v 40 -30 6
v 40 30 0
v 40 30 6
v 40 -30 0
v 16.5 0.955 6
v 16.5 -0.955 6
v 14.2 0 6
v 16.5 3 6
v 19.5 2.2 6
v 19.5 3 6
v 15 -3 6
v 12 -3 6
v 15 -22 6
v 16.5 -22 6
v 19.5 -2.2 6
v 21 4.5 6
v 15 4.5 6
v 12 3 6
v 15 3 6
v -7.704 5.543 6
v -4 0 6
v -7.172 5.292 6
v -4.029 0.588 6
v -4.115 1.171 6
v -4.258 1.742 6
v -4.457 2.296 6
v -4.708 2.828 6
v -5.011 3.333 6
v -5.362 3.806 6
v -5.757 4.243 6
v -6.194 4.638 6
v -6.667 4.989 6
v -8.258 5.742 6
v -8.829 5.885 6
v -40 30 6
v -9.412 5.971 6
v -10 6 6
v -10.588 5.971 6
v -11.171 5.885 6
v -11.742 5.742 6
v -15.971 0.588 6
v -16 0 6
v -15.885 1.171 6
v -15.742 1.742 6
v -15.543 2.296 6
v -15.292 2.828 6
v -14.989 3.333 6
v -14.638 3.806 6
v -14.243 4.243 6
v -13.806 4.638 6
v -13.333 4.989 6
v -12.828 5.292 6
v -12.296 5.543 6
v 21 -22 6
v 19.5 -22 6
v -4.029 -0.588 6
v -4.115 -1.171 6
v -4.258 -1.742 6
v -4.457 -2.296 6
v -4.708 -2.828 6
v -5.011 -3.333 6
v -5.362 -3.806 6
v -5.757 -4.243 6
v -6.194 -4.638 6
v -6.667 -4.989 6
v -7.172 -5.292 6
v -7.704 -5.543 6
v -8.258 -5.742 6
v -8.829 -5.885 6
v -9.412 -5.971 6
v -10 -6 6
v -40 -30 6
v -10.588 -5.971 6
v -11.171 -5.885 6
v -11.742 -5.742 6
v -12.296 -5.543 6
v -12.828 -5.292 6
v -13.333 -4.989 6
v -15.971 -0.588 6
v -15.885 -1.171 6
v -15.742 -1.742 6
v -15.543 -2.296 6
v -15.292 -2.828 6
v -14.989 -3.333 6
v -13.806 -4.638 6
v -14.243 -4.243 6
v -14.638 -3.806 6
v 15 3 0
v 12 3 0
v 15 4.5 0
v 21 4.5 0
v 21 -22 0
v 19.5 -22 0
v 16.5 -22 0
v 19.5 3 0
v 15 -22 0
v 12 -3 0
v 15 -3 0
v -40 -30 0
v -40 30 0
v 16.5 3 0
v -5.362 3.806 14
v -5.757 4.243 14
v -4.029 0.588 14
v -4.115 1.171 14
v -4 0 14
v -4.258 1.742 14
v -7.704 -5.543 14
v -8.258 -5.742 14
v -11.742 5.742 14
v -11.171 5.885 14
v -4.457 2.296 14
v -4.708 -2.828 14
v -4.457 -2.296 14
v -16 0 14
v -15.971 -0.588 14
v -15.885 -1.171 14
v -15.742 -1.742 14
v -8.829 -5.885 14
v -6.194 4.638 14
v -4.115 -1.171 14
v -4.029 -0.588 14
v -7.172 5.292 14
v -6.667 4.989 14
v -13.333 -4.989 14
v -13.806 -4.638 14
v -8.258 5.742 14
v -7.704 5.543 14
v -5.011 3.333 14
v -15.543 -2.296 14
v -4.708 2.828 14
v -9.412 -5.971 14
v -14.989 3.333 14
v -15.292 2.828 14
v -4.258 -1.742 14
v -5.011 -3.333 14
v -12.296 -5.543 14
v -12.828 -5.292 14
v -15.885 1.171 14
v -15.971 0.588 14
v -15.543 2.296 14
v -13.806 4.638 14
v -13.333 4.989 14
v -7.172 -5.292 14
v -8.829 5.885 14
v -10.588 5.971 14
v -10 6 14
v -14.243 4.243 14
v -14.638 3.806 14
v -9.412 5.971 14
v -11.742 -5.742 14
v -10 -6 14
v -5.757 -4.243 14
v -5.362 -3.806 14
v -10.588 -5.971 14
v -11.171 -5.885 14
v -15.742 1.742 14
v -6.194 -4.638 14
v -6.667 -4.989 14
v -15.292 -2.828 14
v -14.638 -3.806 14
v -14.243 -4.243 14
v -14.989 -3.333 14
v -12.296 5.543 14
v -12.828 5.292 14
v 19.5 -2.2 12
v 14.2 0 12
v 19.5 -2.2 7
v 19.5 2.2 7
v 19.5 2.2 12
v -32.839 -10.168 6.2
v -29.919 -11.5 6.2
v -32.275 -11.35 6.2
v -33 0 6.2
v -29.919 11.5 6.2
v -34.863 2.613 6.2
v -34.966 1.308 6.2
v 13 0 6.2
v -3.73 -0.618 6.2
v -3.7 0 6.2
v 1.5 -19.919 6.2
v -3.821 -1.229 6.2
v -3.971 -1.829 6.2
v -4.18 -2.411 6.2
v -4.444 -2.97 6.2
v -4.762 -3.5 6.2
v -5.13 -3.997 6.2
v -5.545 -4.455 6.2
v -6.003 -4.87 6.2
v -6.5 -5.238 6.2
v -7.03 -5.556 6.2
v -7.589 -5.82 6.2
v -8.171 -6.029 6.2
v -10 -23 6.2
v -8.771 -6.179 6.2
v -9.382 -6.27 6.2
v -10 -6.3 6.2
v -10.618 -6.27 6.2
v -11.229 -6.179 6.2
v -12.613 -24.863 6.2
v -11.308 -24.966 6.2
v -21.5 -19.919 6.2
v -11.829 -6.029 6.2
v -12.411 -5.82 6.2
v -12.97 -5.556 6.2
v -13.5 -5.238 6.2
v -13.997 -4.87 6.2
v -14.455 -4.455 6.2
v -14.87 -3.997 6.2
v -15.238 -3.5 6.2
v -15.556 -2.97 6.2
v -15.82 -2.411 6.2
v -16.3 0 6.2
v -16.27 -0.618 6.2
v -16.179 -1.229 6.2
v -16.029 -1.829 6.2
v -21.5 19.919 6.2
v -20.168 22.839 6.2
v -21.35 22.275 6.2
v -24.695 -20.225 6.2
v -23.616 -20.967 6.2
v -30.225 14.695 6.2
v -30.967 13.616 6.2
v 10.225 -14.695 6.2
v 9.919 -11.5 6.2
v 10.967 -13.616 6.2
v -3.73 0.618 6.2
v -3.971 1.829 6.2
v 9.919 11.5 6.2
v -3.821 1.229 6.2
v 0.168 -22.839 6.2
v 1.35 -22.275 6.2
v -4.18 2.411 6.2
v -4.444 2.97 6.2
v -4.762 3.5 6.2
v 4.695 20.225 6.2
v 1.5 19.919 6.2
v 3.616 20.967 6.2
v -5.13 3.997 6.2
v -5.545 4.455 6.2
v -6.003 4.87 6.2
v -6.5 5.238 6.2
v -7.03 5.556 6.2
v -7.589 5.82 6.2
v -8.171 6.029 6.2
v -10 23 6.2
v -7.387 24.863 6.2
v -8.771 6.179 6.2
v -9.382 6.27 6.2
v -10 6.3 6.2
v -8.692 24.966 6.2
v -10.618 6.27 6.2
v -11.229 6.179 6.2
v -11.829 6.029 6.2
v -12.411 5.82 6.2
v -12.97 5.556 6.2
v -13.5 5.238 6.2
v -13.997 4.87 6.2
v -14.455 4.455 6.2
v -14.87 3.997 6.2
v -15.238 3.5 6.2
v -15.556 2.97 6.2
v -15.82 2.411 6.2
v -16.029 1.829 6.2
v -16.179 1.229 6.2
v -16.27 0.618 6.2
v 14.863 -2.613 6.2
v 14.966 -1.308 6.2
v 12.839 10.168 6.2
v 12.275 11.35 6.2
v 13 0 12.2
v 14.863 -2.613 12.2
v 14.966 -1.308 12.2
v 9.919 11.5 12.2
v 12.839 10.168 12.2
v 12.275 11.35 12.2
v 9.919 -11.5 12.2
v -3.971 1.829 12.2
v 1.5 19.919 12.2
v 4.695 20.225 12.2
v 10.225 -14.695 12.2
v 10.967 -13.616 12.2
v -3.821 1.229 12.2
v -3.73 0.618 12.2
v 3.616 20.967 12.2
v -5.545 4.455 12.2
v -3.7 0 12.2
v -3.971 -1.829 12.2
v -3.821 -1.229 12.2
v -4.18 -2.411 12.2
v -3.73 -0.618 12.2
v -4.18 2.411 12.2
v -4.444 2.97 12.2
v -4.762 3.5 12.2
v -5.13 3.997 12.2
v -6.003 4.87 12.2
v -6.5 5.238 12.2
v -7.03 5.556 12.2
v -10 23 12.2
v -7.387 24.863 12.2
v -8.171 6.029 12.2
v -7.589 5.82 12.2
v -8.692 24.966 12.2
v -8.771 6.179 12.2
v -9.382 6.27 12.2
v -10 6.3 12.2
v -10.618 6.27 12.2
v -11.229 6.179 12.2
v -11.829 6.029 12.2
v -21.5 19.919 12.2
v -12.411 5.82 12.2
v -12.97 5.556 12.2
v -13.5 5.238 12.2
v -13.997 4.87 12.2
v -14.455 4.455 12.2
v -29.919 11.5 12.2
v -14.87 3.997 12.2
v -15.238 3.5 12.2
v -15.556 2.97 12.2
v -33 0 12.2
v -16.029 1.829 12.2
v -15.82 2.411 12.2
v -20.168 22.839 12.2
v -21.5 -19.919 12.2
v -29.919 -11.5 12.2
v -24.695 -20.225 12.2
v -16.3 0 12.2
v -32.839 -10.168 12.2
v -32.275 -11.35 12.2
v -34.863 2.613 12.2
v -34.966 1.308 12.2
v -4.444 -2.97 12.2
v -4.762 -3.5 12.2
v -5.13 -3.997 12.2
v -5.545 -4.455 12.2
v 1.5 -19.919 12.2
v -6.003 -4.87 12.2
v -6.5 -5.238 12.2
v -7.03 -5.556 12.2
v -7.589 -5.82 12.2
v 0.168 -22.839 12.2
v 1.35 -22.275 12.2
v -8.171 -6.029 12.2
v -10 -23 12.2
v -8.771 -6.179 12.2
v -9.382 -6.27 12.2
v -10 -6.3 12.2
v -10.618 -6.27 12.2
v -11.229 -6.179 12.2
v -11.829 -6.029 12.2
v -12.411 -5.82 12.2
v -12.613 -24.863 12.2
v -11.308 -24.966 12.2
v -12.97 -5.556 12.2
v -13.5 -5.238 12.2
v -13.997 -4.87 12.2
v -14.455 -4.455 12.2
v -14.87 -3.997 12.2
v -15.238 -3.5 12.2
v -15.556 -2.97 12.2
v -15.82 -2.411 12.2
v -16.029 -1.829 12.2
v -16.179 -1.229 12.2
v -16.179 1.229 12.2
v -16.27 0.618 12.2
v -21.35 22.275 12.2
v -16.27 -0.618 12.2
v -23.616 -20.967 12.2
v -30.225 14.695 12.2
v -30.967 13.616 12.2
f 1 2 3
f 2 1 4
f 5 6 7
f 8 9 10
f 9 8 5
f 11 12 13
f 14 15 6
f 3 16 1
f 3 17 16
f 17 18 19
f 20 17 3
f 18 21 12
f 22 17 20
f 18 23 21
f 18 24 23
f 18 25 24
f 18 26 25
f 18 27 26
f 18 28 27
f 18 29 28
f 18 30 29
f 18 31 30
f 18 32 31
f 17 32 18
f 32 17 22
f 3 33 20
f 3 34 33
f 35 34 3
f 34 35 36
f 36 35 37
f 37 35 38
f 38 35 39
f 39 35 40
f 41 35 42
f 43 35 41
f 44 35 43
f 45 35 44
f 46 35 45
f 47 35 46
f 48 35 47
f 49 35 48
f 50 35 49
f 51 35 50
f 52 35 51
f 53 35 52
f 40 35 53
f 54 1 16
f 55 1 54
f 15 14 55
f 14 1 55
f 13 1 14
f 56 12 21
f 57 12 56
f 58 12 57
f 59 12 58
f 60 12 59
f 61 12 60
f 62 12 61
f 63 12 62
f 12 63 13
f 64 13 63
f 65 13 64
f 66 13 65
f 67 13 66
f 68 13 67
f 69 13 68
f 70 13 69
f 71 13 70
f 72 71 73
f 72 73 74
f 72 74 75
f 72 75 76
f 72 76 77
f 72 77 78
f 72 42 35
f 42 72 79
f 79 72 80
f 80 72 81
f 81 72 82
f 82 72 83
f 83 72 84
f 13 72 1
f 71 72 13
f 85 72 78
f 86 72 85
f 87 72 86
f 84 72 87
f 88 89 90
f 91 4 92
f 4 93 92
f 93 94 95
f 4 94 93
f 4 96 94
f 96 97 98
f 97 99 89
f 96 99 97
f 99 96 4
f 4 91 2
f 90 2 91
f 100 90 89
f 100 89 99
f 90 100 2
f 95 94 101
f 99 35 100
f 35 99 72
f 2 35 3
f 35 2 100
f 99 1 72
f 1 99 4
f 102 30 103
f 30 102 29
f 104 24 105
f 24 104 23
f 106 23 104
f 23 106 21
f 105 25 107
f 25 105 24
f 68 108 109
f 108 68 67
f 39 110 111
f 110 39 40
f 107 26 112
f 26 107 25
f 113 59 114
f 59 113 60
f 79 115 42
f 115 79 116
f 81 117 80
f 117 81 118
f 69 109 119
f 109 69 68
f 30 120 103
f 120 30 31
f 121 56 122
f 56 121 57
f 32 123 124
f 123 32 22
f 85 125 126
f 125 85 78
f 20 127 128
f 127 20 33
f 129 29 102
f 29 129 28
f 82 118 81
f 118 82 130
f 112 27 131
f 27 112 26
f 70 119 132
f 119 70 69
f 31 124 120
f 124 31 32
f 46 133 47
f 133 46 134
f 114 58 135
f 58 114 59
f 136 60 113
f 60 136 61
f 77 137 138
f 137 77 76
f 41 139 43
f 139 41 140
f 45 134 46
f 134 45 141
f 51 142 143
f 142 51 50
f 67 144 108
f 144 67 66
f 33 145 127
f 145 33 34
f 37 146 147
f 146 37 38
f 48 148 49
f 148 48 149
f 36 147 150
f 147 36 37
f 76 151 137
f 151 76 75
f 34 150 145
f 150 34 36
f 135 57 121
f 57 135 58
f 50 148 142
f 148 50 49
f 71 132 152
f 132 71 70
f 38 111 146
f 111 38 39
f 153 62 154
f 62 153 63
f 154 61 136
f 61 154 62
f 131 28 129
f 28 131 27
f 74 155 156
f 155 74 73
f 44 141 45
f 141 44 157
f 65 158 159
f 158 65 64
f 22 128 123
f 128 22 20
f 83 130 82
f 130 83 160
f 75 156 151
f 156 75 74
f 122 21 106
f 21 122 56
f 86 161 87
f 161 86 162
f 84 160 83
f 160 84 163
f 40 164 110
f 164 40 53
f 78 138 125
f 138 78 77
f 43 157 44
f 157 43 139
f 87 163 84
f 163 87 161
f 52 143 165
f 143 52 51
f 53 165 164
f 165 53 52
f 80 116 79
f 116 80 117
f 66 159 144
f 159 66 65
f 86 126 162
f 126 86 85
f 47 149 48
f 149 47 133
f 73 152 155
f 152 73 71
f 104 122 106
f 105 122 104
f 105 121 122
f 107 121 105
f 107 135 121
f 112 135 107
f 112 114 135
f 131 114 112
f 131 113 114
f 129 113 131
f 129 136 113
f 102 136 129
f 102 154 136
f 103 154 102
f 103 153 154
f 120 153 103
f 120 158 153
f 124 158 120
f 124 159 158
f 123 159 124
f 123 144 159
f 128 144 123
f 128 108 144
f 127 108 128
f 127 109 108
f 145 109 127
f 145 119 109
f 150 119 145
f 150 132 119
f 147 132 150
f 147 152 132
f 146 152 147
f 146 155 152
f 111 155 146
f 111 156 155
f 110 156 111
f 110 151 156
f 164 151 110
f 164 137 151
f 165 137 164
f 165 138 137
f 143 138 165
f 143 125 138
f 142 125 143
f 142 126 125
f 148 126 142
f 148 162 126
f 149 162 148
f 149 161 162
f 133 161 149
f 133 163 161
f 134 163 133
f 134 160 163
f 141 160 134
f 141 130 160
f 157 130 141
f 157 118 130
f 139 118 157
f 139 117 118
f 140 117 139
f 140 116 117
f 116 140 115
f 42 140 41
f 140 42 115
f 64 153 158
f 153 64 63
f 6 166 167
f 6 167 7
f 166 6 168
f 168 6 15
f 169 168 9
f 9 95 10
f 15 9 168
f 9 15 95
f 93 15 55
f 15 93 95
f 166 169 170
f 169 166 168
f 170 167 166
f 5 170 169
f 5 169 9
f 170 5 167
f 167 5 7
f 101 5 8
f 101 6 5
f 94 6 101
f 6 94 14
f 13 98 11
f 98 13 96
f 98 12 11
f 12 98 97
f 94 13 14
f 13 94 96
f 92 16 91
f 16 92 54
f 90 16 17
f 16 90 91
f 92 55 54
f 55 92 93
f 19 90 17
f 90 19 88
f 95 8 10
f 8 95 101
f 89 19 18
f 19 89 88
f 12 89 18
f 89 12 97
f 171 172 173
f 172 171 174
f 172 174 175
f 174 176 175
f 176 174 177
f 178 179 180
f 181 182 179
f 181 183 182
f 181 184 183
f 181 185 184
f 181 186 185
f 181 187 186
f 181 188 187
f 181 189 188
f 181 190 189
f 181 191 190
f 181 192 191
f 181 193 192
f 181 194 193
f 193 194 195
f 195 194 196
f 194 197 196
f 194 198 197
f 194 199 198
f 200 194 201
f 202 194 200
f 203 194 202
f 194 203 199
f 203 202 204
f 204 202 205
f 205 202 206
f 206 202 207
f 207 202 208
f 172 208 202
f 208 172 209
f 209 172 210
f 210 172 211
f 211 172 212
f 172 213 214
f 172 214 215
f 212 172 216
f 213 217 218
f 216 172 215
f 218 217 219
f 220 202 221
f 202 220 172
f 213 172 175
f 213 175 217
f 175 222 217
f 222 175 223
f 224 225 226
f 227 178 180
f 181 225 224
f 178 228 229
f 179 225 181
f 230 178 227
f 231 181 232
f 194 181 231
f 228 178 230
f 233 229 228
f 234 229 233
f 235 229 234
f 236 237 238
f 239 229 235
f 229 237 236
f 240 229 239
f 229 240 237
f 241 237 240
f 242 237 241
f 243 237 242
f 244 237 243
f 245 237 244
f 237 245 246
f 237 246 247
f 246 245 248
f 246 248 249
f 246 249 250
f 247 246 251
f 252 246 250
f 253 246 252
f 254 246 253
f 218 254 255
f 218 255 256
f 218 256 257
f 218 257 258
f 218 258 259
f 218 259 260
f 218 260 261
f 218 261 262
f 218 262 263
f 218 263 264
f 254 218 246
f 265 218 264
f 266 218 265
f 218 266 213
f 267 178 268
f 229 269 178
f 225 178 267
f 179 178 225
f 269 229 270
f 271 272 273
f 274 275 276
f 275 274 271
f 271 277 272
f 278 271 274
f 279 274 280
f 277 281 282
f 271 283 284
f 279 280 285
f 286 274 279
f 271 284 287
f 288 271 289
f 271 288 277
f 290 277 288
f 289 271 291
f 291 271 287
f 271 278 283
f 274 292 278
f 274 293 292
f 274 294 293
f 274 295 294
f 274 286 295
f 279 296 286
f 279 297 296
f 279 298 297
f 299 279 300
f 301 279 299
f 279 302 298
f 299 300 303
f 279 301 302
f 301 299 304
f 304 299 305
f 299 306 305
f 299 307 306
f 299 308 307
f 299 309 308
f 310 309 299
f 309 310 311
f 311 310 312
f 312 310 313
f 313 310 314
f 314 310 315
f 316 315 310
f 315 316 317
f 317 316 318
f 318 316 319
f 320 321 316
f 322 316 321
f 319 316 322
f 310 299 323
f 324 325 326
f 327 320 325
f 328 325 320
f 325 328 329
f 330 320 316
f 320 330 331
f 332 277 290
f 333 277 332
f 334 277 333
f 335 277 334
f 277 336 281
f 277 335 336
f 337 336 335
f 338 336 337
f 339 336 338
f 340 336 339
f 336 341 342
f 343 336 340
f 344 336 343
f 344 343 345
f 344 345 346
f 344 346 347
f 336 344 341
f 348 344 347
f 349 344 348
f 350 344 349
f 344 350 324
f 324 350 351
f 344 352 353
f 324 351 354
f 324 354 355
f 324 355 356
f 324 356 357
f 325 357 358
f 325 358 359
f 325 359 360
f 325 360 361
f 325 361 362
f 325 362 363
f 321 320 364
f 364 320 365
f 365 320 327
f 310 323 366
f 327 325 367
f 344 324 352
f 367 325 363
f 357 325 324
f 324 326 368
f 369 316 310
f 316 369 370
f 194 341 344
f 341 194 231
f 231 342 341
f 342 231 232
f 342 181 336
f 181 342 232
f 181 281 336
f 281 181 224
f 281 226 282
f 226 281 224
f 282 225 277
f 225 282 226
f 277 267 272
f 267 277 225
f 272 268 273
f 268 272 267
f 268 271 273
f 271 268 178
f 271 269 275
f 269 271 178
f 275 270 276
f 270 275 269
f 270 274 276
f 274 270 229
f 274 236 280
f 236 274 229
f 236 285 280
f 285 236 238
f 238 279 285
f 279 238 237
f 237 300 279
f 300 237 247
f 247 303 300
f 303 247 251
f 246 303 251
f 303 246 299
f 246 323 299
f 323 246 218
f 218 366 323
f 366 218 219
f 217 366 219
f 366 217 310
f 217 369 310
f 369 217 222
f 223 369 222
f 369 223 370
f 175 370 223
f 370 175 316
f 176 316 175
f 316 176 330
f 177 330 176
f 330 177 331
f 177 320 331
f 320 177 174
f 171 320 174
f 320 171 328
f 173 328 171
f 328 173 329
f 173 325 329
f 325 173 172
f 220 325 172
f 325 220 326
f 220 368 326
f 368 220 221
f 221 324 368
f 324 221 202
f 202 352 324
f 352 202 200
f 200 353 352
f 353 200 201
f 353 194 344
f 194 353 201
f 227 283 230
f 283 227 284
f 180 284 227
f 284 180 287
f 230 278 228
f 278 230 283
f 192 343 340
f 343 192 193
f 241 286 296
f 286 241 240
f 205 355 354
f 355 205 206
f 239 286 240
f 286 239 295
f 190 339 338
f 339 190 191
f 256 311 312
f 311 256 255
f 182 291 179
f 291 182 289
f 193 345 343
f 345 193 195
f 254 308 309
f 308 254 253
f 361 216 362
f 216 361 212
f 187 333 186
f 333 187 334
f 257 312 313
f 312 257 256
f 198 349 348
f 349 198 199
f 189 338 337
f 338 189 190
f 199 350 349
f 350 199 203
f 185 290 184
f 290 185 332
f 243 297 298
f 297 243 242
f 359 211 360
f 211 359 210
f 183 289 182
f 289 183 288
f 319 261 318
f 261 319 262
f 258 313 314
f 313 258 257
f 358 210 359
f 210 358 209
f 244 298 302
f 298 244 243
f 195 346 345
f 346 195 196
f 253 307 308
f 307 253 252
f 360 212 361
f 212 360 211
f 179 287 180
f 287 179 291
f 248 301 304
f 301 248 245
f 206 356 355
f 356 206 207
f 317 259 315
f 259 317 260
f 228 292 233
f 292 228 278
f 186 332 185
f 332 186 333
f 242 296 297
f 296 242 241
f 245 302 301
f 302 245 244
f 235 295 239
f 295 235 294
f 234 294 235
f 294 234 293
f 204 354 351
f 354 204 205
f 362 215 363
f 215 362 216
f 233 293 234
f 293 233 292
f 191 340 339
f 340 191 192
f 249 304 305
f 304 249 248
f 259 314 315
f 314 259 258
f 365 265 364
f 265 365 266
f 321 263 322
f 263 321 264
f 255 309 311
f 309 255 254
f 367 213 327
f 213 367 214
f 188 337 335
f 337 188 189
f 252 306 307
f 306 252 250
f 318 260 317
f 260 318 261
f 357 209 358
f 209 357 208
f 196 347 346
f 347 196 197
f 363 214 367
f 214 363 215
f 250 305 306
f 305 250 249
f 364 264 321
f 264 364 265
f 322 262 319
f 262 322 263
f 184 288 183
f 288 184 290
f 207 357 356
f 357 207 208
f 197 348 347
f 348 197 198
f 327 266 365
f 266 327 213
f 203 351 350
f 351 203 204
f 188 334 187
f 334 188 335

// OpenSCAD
/* Ratchet wheel with spring pawl - desk demo, PLA, 0.4 mm nozzle, no supports.
   Wheel (~50 mm, 12 teeth) turns on a post; the pawl is part of the base on a
   flexible arm cut from the plate. Free way is clockwise seen from above
   (negative rotation about +Z). */
part = "assembly"; // [wheel:Wheel, base:Base, assembly:Assembly]

cadverify_only = "";
module instance(name, part, unit = 1) {
    echo(cadverify_instance = [name, part, unit]);
    if (cadverify_only == "" || cadverify_only == name) children();
}

// ---------- parameters (mm) ----------
Rtip = 25;          // wheel outer radius (50 mm across)
Rroot = 23;         // wheel root radius (tooth height 2 mm)
wheel_t = 6;        // wheel thickness
hole_D = 12.6;      // wheel centre hole diameter
post_D = 12;        // base post diameter (0.6 mm play on diameter)
post_h = 8;         // post height above base top
base_t = 6;         // base plate thickness
base_x = 80;
base_y = 60;
wheel_cx = -10;     // wheel centre in base/assembly XY
wheel_cy = 0;
wheel_gap = 0.2;    // wheel bottom above base top
wheel_lift_z = base_t + wheel_gap;   // 6.2 wheel bottom in assembly
post_top_z = base_t + post_h;        // 14
pawl_tip_x = 14.2;  // pawl tip: 0.8 inside tip circle, 1.2 off root
beam_x0 = 16.5; beam_x1 = 19.5;      // flexible arm: 3 mm wide ...
beam_y0 = -22; beam_y1 = 3;          // ... 25 mm long, fixed south, free north
slot_w = 1.5;       // slot width (clears a 0.4 mm nozzle)
pawl_h = 6;         // pawl height above plate (meets wheel band 6.2..12.2)
rest_angle = 0;     // gullet bottom centred on pawl tip

// tooth k: root at 30k, shallow rise to tip at 30k+24, tip land to +27,
// steep drop to root at +30. Shallow face cams the pawl out (free way),
// steep face pushes along the arm (locks reverse).
function wheel_pts() = [
    for(k=[0:11]) for(j=[0:2])
        j==0 ? [Rroot*cos(k*30), Rroot*sin(k*30)]
      : j==1 ? [Rtip*cos(k*30+24), Rtip*sin(k*30+24)]
             : [Rtip*cos(k*30+27), Rtip*sin(k*30+27)]
];

module wheel() {
    difference() {
        linear_extrude(height=wheel_t, convexity=4)
            polygon(points=wheel_pts());
        translate([0,0,-1]) cylinder(d=hole_D, h=wheel_t+2, $fn=64);
    }
}

module base() {
    difference() {
        union() {
            // plate
            translate([-base_x/2, -base_y/2, 0]) cube([base_x, base_y, base_t]);
            // post the wheel turns on
            translate([wheel_cx, wheel_cy, base_t]) cylinder(d=post_D, h=post_h, $fn=64);
            // pawl wedge: tip near the wheel, root fused onto the free end of the arm
            translate([0,0,base_t]) linear_extrude(height=pawl_h, convexity=2)
                polygon(points=[[pawl_tip_x, 0],[beam_x1, 2.2],[beam_x1, -2.2]]);
        }
        // U-slot freeing the arm (one connected through opening) + window under pawl tip
        translate([beam_x0-slot_w, beam_y0, -1]) cube([slot_w, 19, base_t+2]); // west x15..16.5 y-22..-3
        translate([beam_x1, beam_y0, -1]) cube([slot_w, 26.5, base_t+2]);      // east x19.5..21 y-22..4.5
        translate([beam_x0-slot_w, beam_y1, -1]) cube([6, slot_w, base_t+2]);  // north x15..21 y3..4.5
        translate([12, -3, -1]) cube([4.5, 6, base_t+1]);                         // window x12..16.5 y-3..3 (plate only)
    }
}

module assembly() {
    instance("base_inst", "base", 1) base();
    instance("wheel_inst", "wheel", 1)
        translate([wheel_cx, wheel_cy, wheel_lift_z]) rotate([0,0,rest_angle]) wheel();
}

// ---------- specs (computed from parameters) ----------
wheel_spec = [
    ["bounds", [[-Rtip, -Rtip, 0], [Rtip, Rtip, wheel_t]]],
    ["bodies", 1],
    ["through_holes", 1],
    ["support_faces", [["bed", "-z", 800]]],
    ["overhangs_allowed", []],
    ["copies", 1],
    ["details", [
        ["axle_hole", "hole", [0, 0, wheel_t+4], [0, 0, -1], [[0, hole_D], [3, hole_D]]],
        ["rim_thick", "thickness", [15, 0, wheel_t+4], [0, 0, -1], wheel_t],
        ["tooth0", "material", [[22.05, 7.71, 0], [23.05, 8.71, wheel_t]], 0.5],
        ["tooth4", "material", [[-18.89, 14.93, 0], [-17.89, 15.93, wheel_t]], 0.5],
        ["tooth8", "material", [[-4.67, -24.14, 0], [-3.67, -23.14, wheel_t]], 0.5]
    ]]
];

base_spec = [
    ["bounds", [[-base_x/2, -base_y/2, 0], [base_x/2, base_y/2, post_top_z]]],
    ["bodies", 1],
    ["through_holes", 1],
    ["support_faces", [["bed", "-z", 2000]]],
    ["overhangs_allowed", [["pawl bridges slot", [[14, -1.5, 5.9], [17, 1.5, 6.1]]]]],
    ["copies", 1],
    ["details", [
        ["plate_thick", "thickness", [0, -28, base_t+4], [0, 0, -1], base_t],
        ["post_dia", "thickness", [wheel_cx-10, wheel_cy, base_t+post_h-1], [1, 0, 0], post_D],
        ["post_core", "material", [[wheel_cx-2, -2, 8], [wheel_cx+2, 2, 13]], 0.8],
        ["arm_width", "thickness", [beam_x0-0.75, -16, 3], [1, 0, 0], beam_x1-beam_x0],
        ["arm_full", "material", [[17, -20, 0], [19, -12, base_t]], 0.8],
        ["slot_gap", "void", [[beam_x0-slot_w, -20, 0], [beam_x0, -10, base_t]], 0.8],
        ["window_void", "void", [[12.5, -2.5, 0], [16, 2.5, base_t]], 0.8],
        ["pawl_tip", "material", [[14.9, -0.2, 8], [15.7, 0.2, 11]], 0.5],
        ["pawl_height", "thickness", [14.5, 0, base_t+pawl_h+3], [0, 0, -1], pawl_h]
    ]]
];

assembly_spec = [
    ["bounds", [[-base_x/2, -base_y/2, 0], [base_x/2, base_y/2, post_top_z]]],
    ["support_faces", [["desk", "-z", 2000]]],
    ["allowed_interferences", []],
    ["motions", [
        ["spin_free", ["wheel_inst"], "rotate", [wheel_cx, wheel_cy, wheel_lift_z], [0, 0, 1], [0, -360],
            ["flex", [["wheel_inst", "base_inst", 0.9, "pawl clicks over teeth"]]]]
    ]],
    ["assembly_order", [
        [["base_inst"], [0, 0, 0]],
        [["wheel_inst"], [0, 0, -1]]
    ]]
];

if (part == "wheel") {
    echo(cadverify_spec = wheel_spec);
    wheel();
} else if (part == "base") {
    echo(cadverify_spec = base_spec);
    base();
} else {
    echo(cadverify_spec = assembly_spec);
    assembly();
}
